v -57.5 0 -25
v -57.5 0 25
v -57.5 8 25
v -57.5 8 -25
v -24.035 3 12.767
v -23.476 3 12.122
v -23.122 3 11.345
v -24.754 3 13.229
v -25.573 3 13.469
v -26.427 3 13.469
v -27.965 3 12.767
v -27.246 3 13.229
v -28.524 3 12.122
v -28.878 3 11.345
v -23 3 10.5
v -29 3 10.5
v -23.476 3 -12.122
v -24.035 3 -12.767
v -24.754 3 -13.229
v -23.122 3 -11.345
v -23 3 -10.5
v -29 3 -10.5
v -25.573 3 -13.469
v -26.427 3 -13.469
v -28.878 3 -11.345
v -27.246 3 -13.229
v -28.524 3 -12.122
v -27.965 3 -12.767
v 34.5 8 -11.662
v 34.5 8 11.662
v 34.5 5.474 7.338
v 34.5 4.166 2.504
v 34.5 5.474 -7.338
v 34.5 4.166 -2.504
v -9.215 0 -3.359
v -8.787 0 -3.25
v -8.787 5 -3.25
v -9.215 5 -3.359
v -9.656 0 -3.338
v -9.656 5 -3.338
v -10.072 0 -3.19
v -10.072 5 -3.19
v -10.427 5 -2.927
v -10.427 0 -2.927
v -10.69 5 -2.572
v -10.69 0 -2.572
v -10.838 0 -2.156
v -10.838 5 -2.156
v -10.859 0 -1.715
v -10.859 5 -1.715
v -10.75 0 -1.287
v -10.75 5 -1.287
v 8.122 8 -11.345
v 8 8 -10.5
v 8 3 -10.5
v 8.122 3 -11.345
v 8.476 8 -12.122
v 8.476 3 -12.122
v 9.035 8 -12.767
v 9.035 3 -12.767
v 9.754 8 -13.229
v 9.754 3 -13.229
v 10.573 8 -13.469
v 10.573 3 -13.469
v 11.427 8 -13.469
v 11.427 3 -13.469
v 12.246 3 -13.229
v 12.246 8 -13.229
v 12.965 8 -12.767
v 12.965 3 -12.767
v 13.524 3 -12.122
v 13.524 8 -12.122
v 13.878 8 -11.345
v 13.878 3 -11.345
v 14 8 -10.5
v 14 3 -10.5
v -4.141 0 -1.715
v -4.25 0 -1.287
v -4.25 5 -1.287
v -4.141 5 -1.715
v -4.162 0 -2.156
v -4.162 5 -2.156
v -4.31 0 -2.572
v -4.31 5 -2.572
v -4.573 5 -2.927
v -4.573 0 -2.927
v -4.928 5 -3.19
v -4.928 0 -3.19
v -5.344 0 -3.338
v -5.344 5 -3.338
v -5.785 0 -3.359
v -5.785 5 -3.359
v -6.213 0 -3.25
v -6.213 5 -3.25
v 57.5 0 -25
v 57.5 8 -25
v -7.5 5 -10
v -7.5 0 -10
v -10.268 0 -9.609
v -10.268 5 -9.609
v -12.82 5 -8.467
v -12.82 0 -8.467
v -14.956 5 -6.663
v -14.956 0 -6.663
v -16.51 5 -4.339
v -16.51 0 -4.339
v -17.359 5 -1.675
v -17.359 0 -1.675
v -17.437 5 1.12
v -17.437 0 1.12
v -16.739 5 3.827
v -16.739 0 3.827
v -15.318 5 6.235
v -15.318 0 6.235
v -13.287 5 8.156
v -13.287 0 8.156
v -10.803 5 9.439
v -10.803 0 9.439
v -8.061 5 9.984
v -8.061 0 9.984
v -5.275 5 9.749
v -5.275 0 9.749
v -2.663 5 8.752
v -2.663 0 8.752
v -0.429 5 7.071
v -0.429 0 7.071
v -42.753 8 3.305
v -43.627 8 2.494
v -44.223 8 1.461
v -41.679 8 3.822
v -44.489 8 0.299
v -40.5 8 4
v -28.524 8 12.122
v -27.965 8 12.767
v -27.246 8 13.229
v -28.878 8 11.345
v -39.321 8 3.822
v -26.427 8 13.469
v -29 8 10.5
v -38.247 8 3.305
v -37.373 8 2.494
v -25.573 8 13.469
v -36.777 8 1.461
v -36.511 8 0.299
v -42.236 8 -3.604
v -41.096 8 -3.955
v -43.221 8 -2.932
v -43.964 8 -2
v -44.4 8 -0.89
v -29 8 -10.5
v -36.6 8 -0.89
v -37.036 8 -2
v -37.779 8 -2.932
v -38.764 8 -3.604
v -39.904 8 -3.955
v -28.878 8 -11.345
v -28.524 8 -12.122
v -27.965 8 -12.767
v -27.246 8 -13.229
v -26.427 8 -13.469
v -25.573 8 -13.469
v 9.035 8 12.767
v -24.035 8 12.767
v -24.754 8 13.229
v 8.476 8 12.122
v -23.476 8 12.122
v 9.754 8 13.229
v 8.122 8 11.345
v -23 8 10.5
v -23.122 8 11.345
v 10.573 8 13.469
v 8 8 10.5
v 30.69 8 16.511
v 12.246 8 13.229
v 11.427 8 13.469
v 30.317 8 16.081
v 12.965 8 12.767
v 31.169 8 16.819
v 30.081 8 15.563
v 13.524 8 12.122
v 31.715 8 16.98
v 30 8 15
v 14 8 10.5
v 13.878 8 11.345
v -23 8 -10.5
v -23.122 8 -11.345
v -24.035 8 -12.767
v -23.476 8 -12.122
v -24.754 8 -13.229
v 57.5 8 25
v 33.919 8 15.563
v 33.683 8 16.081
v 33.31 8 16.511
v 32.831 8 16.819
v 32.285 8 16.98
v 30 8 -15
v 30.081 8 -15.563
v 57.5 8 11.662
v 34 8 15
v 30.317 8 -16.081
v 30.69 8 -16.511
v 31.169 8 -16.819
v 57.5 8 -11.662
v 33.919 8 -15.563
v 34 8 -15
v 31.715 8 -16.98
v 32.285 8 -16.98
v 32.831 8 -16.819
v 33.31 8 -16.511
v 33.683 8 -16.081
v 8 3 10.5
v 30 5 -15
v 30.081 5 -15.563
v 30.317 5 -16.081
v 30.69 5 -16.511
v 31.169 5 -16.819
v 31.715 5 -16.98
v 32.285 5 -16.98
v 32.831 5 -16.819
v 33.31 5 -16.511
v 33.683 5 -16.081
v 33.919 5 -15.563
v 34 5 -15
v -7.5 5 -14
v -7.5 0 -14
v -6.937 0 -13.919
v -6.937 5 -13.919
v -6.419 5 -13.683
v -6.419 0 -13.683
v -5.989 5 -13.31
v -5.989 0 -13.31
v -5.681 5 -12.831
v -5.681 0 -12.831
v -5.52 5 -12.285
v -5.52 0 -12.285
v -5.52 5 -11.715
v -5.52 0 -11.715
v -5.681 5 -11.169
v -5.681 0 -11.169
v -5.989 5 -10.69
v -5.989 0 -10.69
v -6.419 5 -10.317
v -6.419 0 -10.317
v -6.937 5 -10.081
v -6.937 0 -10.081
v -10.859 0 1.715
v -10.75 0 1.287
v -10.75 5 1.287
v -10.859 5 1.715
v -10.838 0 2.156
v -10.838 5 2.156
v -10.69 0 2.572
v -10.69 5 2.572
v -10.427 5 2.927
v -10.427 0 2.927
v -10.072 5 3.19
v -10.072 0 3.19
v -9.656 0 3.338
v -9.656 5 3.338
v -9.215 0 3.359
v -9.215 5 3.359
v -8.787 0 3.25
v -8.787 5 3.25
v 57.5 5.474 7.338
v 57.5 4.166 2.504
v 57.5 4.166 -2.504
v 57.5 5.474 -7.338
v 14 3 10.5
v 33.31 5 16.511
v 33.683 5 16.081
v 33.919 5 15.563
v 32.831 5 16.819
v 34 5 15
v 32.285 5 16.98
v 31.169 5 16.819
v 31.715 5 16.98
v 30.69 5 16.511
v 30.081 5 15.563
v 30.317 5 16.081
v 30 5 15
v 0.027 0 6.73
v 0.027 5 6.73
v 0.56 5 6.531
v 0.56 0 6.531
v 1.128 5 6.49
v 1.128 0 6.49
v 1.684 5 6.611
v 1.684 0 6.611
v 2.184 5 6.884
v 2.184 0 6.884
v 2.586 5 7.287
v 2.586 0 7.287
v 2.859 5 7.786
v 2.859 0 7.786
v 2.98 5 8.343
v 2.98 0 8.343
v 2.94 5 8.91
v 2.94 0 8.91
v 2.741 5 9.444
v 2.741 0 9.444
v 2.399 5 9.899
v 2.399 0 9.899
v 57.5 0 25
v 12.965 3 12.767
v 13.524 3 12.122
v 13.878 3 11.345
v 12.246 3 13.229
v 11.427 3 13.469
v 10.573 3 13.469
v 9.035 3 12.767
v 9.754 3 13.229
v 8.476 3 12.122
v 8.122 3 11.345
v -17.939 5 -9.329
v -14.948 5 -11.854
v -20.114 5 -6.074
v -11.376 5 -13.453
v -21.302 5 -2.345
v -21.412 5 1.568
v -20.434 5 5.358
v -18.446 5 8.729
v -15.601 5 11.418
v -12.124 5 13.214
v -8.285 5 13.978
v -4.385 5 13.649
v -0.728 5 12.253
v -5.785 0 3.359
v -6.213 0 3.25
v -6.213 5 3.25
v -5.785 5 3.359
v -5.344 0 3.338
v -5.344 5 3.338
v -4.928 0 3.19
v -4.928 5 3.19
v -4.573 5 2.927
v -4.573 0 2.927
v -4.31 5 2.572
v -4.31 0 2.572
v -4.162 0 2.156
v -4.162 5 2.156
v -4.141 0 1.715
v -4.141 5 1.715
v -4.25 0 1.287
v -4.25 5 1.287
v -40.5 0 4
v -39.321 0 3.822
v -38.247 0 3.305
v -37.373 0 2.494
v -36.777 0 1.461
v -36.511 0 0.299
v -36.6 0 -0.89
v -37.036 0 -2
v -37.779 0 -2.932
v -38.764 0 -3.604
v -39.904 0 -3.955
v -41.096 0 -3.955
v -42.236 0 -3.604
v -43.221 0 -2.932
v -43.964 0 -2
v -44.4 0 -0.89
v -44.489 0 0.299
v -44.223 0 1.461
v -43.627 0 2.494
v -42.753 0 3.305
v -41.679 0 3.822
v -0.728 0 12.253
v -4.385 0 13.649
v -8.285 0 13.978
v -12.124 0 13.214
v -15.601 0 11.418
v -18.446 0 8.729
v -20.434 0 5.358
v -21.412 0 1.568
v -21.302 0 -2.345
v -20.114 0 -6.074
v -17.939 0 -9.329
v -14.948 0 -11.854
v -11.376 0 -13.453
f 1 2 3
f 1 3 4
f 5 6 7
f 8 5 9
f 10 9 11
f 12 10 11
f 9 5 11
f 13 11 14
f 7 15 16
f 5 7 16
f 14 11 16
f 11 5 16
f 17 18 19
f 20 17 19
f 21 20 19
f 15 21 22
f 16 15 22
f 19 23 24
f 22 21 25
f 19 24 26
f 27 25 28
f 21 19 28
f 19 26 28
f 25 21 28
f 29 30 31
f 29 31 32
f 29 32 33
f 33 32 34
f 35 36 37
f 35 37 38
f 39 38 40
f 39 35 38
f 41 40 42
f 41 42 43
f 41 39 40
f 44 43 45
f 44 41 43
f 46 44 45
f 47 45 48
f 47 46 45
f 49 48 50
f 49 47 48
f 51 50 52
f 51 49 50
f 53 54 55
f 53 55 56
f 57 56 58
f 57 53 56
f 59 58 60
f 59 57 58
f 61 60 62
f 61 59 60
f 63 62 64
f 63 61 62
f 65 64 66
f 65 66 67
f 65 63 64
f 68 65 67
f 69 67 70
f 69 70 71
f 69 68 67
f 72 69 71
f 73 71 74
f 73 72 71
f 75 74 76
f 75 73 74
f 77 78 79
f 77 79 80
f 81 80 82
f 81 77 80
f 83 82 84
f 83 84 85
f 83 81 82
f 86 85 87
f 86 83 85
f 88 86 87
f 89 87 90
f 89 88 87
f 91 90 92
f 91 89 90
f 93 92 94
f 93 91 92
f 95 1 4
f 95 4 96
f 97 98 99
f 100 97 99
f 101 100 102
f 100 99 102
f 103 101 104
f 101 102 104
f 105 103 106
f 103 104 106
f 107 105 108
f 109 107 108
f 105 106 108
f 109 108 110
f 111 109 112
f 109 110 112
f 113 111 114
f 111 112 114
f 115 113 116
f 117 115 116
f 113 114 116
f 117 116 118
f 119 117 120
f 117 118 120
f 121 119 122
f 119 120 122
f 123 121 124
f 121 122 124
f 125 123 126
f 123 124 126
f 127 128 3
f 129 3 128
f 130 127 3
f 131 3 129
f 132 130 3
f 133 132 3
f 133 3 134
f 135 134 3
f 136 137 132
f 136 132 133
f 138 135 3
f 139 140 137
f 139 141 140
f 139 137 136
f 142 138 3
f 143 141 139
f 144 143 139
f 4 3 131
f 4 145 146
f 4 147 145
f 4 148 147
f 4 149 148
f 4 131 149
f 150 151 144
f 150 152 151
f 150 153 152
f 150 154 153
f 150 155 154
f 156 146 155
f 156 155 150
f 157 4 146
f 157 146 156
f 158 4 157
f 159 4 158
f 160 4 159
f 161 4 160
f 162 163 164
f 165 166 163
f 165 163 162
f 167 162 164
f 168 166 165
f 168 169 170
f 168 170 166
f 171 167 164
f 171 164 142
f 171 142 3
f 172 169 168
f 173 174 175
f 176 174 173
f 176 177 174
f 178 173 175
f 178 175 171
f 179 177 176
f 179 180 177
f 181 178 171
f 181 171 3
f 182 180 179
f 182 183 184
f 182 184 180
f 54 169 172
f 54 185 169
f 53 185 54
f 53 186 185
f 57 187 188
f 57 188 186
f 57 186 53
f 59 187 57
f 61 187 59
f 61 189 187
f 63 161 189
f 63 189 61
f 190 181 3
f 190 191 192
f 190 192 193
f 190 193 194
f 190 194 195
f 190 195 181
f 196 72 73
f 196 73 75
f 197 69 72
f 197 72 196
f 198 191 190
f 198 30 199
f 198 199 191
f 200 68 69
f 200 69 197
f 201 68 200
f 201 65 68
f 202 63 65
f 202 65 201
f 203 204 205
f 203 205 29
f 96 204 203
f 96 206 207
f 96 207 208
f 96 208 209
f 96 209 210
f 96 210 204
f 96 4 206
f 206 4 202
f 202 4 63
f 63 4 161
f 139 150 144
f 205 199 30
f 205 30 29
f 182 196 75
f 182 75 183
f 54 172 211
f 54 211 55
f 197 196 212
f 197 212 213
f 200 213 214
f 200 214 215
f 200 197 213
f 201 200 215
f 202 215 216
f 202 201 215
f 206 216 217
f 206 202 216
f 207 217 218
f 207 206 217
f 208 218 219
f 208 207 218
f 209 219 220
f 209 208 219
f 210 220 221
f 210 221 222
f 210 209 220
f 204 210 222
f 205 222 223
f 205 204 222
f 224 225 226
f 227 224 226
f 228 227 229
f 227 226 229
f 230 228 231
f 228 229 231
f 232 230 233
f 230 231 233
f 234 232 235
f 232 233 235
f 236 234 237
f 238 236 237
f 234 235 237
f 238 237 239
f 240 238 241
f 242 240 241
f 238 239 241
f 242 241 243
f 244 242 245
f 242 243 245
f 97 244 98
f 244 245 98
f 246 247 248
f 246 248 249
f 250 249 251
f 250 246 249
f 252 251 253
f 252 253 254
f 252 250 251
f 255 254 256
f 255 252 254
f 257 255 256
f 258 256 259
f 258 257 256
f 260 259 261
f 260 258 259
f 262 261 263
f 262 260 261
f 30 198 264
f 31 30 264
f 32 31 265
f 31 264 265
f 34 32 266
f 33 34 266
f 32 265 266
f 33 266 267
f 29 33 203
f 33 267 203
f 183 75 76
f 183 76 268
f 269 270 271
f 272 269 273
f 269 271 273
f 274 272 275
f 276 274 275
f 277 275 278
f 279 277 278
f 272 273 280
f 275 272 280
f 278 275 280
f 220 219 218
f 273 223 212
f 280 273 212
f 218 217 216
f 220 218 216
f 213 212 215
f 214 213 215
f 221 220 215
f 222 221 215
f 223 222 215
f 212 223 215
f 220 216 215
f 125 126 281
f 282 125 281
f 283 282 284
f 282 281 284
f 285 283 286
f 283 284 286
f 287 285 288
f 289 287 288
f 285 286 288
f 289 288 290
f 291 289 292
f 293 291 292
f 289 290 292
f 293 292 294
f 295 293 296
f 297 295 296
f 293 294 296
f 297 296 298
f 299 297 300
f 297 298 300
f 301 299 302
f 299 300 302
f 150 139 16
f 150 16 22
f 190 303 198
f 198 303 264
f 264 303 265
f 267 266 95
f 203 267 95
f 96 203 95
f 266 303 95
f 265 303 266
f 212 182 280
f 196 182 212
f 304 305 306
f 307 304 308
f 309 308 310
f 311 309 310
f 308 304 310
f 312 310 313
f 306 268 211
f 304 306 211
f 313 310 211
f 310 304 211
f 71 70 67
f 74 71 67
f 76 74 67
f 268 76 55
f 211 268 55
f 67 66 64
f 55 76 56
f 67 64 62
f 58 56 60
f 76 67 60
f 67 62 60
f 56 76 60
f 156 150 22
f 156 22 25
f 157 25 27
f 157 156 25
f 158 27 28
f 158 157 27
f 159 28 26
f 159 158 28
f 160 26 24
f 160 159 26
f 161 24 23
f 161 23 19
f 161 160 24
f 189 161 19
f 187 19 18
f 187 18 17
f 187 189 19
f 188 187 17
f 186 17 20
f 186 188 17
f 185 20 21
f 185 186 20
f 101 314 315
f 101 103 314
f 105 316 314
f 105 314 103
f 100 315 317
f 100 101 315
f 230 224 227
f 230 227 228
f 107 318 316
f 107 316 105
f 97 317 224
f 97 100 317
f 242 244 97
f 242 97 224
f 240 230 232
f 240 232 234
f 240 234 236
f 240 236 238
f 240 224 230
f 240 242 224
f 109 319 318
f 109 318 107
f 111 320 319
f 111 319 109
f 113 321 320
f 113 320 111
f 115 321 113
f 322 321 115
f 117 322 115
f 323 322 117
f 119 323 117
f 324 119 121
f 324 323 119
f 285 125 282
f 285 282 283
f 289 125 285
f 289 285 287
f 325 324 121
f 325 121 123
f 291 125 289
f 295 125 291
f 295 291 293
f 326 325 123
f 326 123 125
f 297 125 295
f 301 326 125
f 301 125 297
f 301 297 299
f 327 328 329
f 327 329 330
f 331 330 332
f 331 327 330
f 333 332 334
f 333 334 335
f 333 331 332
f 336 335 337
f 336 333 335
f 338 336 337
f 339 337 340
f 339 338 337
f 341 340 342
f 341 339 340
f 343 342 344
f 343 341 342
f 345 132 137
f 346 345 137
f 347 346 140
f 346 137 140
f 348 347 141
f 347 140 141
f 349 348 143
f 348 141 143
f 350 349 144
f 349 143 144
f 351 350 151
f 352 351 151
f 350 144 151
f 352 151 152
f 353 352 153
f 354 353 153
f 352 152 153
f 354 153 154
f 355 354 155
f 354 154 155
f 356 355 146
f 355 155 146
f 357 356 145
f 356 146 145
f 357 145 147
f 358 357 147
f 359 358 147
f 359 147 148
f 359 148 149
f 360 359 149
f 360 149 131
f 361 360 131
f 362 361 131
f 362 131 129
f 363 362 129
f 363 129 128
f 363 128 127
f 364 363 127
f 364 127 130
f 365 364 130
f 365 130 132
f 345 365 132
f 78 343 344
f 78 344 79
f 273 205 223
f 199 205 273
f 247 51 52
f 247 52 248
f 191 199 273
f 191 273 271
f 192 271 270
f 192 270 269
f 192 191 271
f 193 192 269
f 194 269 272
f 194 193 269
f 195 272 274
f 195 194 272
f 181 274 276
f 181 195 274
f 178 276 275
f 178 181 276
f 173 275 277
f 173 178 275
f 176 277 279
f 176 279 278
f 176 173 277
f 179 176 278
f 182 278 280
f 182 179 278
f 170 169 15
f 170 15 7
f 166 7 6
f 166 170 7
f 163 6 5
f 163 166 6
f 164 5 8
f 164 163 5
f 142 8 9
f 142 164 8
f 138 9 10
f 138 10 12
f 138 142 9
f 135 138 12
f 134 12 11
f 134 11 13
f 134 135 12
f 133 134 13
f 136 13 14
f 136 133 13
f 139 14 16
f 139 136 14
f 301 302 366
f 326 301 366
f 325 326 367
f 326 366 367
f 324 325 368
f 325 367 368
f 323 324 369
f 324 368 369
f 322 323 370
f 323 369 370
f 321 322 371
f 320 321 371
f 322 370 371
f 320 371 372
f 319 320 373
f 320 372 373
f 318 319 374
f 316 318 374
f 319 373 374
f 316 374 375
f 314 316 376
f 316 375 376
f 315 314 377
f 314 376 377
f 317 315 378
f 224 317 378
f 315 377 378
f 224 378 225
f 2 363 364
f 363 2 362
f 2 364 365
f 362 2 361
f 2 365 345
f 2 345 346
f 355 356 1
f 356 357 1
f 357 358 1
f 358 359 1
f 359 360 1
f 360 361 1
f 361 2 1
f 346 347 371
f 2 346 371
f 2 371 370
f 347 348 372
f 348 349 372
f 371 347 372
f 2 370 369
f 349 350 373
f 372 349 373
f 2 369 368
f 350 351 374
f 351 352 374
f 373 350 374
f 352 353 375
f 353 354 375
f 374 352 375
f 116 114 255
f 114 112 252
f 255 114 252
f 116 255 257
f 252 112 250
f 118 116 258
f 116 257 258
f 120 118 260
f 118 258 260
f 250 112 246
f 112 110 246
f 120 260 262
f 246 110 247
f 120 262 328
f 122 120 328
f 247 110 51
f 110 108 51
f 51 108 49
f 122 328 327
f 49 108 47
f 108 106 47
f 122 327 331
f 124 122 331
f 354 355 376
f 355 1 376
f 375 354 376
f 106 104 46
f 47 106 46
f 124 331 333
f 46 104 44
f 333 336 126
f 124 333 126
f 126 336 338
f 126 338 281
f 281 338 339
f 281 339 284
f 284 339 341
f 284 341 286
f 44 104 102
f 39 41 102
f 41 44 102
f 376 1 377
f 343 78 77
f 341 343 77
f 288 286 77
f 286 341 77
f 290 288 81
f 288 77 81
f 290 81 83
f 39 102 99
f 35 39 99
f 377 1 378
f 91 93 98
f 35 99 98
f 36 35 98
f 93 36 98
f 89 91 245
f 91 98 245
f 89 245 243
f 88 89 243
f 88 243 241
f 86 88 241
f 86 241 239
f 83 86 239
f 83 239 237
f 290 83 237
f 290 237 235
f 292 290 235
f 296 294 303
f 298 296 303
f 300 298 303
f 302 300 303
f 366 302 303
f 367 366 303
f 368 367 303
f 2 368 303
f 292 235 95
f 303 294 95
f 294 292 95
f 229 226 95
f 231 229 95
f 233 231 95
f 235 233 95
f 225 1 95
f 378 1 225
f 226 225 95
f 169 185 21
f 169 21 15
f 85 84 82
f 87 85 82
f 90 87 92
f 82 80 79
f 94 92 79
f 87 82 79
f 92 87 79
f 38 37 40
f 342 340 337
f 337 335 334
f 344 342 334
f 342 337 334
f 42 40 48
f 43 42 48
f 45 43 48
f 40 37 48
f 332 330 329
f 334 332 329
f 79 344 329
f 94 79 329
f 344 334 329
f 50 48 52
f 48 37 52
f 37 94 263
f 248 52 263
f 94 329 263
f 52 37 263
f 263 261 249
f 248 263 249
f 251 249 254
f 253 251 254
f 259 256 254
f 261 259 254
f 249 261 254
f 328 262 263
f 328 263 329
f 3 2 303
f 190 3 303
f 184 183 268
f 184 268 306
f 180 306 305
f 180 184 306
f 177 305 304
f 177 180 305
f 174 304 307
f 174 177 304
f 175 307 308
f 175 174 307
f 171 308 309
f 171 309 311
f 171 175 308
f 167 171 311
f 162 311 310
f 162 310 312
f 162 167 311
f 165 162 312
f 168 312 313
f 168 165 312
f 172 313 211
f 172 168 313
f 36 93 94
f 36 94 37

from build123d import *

# Parameters (mm, degrees)
SKETCH1_W           = 115
SKETCH1_H           = 50
BOSS_EXTRUDE1_DEPTH = 8
SKETCH2_R           = 4
CUT_EXTRUDE1_DEPTH  = 10
CUT_EXTRUDE2_DEPTH  = 5
LPATTERN1_COUNT     = 2
LPATTERN1_PITCH     = 37
CUT_EXTRUDE3_DEPTH  = 3
CUT_EXTRUDE4_DEPTH  = 23
CUT_EXTRUDE8_DEPTH  = 5
CUT_EXTRUDE9_DEPTH  = 5


with BuildPart() as part:
    # Sketch1 → Boss-Extrude1 (new body)
    with BuildSketch(Plane(origin=(0, 0, 0), x_dir=(1, 0, 0), z_dir=(0, 1, 0))):
        Rectangle(SKETCH1_W, SKETCH1_H)
    extrude(amount=BOSS_EXTRUDE1_DEPTH)

    # Sketch2 → Cut-Extrude1 (cut)
    with BuildSketch(Plane(origin=(0, 8, 0), x_dir=(1, 0, 0), z_dir=(0, 1, 0))):
        with Locations(Location((-40.5, 0, 0), (0, 0, 270))):
            Circle(SKETCH2_R)
    extrude(amount=-CUT_EXTRUDE1_DEPTH, mode=Mode.SUBTRACT)

    # Sketch3 → Cut-Extrude2 (cut)
    with BuildSketch(Plane(origin=(0, 8, 0), x_dir=(1, 0, 0), z_dir=(0, 1, 0))):
        with BuildLine():
            Line((-29, -10.5), (-29, 10.5))
            ThreePointArc((-29, 10.5), (-26, 13.5), (-23, 10.5))
            Line((-23, 10.5), (-23, -10.5))
            ThreePointArc((-23, -10.5), (-26, -13.5), (-29, -10.5))
        make_face()
    cut_extrude2 = extrude(amount=-CUT_EXTRUDE2_DEPTH, mode=Mode.SUBTRACT)

    # LPattern1: Cut-Extrude2 ×2
    with Locations(*[(i * LPATTERN1_PITCH, 0, 0) for i in range(1, LPATTERN1_COUNT)]):
        add(cut_extrude2, mode=Mode.SUBTRACT)

    # Sketch4 → Cut-Extrude3 (cut)
    with BuildSketch(Plane(origin=(0, 8, 0), x_dir=(1, 0, 0), z_dir=(0, 1, 0))):
        with BuildLine():
            Line((34, 15), (34, -15))
            ThreePointArc((34, -15), (32, -17), (30, -15))
            Line((30, -15), (30, 15))
            ThreePointArc((30, 15), (32, 17), (34, 15))
        make_face()
    extrude(amount=-CUT_EXTRUDE3_DEPTH, mode=Mode.SUBTRACT)

    # Sketch5 → Cut-Extrude4 (cut)
    with BuildSketch(Plane(origin=(57.5, 0, 0), x_dir=(0, 0, -1), z_dir=(1, 0, 0))):
        with BuildLine():
            Line((11.66190379, 8), (0, 23))
            Line((0, 23), (-11.66190379, 8))
            ThreePointArc((-11.66190379, 8), (0, 4), (11.66190379, 8))
        make_face()
    extrude(amount=-CUT_EXTRUDE4_DEPTH, mode=Mode.SUBTRACT)

    # Sketch9 → Cut-Extrude8 (cut)
    with BuildSketch(Plane.XZ):
        with BuildLine():
            Line((-8.787415011, 3.25), (-6.212584989, 3.25))
            ThreePointArc((-6.212584989, 3.25), (-4.573205347, 2.926794653), (-4.25, 1.287415011))
            Line((-4.25, 1.287415011), (-4.25, -1.287415011))
            ThreePointArc((-4.25, -1.287415011), (-4.573205347, -2.926794653), (-6.212584989, -3.25))
            Line((-6.212584989, -3.25), (-8.787415011, -3.25))
            ThreePointArc((-8.787415011, -3.25), (-10.426794653, -2.926794653), (-10.75, -1.287415011))
            Line((-10.75, -1.287415011), (-10.75, 1.287415011))
            ThreePointArc((-10.75, 1.287415011), (-10.426794653, 2.926794653), (-8.787415011, 3.25))
        make_face()
    extrude(amount=-CUT_EXTRUDE8_DEPTH, mode=Mode.SUBTRACT)

    # Sketch10 → Cut-Extrude9 (cut)
    with BuildSketch(Plane.XZ):
        with BuildLine():
            ThreePointArc((2.399494937, 9.899494937), (-20.434313455, 5.357568053), (-7.5, -14))
            ThreePointArc((-7.5, -14), (-5.5, -12), (-7.5, -10))
            ThreePointArc((-7.5, -10), (-16.738795325, 3.826834324), (-0.428932188, 7.071067812))
            ThreePointArc((-0.428932188, 7.071067812), (2.399494937, 7.071067812), (2.399494937, 9.899494937))
        make_face()
    extrude(amount=-CUT_EXTRUDE9_DEPTH, mode=Mode.SUBTRACT)


solid = part.part
